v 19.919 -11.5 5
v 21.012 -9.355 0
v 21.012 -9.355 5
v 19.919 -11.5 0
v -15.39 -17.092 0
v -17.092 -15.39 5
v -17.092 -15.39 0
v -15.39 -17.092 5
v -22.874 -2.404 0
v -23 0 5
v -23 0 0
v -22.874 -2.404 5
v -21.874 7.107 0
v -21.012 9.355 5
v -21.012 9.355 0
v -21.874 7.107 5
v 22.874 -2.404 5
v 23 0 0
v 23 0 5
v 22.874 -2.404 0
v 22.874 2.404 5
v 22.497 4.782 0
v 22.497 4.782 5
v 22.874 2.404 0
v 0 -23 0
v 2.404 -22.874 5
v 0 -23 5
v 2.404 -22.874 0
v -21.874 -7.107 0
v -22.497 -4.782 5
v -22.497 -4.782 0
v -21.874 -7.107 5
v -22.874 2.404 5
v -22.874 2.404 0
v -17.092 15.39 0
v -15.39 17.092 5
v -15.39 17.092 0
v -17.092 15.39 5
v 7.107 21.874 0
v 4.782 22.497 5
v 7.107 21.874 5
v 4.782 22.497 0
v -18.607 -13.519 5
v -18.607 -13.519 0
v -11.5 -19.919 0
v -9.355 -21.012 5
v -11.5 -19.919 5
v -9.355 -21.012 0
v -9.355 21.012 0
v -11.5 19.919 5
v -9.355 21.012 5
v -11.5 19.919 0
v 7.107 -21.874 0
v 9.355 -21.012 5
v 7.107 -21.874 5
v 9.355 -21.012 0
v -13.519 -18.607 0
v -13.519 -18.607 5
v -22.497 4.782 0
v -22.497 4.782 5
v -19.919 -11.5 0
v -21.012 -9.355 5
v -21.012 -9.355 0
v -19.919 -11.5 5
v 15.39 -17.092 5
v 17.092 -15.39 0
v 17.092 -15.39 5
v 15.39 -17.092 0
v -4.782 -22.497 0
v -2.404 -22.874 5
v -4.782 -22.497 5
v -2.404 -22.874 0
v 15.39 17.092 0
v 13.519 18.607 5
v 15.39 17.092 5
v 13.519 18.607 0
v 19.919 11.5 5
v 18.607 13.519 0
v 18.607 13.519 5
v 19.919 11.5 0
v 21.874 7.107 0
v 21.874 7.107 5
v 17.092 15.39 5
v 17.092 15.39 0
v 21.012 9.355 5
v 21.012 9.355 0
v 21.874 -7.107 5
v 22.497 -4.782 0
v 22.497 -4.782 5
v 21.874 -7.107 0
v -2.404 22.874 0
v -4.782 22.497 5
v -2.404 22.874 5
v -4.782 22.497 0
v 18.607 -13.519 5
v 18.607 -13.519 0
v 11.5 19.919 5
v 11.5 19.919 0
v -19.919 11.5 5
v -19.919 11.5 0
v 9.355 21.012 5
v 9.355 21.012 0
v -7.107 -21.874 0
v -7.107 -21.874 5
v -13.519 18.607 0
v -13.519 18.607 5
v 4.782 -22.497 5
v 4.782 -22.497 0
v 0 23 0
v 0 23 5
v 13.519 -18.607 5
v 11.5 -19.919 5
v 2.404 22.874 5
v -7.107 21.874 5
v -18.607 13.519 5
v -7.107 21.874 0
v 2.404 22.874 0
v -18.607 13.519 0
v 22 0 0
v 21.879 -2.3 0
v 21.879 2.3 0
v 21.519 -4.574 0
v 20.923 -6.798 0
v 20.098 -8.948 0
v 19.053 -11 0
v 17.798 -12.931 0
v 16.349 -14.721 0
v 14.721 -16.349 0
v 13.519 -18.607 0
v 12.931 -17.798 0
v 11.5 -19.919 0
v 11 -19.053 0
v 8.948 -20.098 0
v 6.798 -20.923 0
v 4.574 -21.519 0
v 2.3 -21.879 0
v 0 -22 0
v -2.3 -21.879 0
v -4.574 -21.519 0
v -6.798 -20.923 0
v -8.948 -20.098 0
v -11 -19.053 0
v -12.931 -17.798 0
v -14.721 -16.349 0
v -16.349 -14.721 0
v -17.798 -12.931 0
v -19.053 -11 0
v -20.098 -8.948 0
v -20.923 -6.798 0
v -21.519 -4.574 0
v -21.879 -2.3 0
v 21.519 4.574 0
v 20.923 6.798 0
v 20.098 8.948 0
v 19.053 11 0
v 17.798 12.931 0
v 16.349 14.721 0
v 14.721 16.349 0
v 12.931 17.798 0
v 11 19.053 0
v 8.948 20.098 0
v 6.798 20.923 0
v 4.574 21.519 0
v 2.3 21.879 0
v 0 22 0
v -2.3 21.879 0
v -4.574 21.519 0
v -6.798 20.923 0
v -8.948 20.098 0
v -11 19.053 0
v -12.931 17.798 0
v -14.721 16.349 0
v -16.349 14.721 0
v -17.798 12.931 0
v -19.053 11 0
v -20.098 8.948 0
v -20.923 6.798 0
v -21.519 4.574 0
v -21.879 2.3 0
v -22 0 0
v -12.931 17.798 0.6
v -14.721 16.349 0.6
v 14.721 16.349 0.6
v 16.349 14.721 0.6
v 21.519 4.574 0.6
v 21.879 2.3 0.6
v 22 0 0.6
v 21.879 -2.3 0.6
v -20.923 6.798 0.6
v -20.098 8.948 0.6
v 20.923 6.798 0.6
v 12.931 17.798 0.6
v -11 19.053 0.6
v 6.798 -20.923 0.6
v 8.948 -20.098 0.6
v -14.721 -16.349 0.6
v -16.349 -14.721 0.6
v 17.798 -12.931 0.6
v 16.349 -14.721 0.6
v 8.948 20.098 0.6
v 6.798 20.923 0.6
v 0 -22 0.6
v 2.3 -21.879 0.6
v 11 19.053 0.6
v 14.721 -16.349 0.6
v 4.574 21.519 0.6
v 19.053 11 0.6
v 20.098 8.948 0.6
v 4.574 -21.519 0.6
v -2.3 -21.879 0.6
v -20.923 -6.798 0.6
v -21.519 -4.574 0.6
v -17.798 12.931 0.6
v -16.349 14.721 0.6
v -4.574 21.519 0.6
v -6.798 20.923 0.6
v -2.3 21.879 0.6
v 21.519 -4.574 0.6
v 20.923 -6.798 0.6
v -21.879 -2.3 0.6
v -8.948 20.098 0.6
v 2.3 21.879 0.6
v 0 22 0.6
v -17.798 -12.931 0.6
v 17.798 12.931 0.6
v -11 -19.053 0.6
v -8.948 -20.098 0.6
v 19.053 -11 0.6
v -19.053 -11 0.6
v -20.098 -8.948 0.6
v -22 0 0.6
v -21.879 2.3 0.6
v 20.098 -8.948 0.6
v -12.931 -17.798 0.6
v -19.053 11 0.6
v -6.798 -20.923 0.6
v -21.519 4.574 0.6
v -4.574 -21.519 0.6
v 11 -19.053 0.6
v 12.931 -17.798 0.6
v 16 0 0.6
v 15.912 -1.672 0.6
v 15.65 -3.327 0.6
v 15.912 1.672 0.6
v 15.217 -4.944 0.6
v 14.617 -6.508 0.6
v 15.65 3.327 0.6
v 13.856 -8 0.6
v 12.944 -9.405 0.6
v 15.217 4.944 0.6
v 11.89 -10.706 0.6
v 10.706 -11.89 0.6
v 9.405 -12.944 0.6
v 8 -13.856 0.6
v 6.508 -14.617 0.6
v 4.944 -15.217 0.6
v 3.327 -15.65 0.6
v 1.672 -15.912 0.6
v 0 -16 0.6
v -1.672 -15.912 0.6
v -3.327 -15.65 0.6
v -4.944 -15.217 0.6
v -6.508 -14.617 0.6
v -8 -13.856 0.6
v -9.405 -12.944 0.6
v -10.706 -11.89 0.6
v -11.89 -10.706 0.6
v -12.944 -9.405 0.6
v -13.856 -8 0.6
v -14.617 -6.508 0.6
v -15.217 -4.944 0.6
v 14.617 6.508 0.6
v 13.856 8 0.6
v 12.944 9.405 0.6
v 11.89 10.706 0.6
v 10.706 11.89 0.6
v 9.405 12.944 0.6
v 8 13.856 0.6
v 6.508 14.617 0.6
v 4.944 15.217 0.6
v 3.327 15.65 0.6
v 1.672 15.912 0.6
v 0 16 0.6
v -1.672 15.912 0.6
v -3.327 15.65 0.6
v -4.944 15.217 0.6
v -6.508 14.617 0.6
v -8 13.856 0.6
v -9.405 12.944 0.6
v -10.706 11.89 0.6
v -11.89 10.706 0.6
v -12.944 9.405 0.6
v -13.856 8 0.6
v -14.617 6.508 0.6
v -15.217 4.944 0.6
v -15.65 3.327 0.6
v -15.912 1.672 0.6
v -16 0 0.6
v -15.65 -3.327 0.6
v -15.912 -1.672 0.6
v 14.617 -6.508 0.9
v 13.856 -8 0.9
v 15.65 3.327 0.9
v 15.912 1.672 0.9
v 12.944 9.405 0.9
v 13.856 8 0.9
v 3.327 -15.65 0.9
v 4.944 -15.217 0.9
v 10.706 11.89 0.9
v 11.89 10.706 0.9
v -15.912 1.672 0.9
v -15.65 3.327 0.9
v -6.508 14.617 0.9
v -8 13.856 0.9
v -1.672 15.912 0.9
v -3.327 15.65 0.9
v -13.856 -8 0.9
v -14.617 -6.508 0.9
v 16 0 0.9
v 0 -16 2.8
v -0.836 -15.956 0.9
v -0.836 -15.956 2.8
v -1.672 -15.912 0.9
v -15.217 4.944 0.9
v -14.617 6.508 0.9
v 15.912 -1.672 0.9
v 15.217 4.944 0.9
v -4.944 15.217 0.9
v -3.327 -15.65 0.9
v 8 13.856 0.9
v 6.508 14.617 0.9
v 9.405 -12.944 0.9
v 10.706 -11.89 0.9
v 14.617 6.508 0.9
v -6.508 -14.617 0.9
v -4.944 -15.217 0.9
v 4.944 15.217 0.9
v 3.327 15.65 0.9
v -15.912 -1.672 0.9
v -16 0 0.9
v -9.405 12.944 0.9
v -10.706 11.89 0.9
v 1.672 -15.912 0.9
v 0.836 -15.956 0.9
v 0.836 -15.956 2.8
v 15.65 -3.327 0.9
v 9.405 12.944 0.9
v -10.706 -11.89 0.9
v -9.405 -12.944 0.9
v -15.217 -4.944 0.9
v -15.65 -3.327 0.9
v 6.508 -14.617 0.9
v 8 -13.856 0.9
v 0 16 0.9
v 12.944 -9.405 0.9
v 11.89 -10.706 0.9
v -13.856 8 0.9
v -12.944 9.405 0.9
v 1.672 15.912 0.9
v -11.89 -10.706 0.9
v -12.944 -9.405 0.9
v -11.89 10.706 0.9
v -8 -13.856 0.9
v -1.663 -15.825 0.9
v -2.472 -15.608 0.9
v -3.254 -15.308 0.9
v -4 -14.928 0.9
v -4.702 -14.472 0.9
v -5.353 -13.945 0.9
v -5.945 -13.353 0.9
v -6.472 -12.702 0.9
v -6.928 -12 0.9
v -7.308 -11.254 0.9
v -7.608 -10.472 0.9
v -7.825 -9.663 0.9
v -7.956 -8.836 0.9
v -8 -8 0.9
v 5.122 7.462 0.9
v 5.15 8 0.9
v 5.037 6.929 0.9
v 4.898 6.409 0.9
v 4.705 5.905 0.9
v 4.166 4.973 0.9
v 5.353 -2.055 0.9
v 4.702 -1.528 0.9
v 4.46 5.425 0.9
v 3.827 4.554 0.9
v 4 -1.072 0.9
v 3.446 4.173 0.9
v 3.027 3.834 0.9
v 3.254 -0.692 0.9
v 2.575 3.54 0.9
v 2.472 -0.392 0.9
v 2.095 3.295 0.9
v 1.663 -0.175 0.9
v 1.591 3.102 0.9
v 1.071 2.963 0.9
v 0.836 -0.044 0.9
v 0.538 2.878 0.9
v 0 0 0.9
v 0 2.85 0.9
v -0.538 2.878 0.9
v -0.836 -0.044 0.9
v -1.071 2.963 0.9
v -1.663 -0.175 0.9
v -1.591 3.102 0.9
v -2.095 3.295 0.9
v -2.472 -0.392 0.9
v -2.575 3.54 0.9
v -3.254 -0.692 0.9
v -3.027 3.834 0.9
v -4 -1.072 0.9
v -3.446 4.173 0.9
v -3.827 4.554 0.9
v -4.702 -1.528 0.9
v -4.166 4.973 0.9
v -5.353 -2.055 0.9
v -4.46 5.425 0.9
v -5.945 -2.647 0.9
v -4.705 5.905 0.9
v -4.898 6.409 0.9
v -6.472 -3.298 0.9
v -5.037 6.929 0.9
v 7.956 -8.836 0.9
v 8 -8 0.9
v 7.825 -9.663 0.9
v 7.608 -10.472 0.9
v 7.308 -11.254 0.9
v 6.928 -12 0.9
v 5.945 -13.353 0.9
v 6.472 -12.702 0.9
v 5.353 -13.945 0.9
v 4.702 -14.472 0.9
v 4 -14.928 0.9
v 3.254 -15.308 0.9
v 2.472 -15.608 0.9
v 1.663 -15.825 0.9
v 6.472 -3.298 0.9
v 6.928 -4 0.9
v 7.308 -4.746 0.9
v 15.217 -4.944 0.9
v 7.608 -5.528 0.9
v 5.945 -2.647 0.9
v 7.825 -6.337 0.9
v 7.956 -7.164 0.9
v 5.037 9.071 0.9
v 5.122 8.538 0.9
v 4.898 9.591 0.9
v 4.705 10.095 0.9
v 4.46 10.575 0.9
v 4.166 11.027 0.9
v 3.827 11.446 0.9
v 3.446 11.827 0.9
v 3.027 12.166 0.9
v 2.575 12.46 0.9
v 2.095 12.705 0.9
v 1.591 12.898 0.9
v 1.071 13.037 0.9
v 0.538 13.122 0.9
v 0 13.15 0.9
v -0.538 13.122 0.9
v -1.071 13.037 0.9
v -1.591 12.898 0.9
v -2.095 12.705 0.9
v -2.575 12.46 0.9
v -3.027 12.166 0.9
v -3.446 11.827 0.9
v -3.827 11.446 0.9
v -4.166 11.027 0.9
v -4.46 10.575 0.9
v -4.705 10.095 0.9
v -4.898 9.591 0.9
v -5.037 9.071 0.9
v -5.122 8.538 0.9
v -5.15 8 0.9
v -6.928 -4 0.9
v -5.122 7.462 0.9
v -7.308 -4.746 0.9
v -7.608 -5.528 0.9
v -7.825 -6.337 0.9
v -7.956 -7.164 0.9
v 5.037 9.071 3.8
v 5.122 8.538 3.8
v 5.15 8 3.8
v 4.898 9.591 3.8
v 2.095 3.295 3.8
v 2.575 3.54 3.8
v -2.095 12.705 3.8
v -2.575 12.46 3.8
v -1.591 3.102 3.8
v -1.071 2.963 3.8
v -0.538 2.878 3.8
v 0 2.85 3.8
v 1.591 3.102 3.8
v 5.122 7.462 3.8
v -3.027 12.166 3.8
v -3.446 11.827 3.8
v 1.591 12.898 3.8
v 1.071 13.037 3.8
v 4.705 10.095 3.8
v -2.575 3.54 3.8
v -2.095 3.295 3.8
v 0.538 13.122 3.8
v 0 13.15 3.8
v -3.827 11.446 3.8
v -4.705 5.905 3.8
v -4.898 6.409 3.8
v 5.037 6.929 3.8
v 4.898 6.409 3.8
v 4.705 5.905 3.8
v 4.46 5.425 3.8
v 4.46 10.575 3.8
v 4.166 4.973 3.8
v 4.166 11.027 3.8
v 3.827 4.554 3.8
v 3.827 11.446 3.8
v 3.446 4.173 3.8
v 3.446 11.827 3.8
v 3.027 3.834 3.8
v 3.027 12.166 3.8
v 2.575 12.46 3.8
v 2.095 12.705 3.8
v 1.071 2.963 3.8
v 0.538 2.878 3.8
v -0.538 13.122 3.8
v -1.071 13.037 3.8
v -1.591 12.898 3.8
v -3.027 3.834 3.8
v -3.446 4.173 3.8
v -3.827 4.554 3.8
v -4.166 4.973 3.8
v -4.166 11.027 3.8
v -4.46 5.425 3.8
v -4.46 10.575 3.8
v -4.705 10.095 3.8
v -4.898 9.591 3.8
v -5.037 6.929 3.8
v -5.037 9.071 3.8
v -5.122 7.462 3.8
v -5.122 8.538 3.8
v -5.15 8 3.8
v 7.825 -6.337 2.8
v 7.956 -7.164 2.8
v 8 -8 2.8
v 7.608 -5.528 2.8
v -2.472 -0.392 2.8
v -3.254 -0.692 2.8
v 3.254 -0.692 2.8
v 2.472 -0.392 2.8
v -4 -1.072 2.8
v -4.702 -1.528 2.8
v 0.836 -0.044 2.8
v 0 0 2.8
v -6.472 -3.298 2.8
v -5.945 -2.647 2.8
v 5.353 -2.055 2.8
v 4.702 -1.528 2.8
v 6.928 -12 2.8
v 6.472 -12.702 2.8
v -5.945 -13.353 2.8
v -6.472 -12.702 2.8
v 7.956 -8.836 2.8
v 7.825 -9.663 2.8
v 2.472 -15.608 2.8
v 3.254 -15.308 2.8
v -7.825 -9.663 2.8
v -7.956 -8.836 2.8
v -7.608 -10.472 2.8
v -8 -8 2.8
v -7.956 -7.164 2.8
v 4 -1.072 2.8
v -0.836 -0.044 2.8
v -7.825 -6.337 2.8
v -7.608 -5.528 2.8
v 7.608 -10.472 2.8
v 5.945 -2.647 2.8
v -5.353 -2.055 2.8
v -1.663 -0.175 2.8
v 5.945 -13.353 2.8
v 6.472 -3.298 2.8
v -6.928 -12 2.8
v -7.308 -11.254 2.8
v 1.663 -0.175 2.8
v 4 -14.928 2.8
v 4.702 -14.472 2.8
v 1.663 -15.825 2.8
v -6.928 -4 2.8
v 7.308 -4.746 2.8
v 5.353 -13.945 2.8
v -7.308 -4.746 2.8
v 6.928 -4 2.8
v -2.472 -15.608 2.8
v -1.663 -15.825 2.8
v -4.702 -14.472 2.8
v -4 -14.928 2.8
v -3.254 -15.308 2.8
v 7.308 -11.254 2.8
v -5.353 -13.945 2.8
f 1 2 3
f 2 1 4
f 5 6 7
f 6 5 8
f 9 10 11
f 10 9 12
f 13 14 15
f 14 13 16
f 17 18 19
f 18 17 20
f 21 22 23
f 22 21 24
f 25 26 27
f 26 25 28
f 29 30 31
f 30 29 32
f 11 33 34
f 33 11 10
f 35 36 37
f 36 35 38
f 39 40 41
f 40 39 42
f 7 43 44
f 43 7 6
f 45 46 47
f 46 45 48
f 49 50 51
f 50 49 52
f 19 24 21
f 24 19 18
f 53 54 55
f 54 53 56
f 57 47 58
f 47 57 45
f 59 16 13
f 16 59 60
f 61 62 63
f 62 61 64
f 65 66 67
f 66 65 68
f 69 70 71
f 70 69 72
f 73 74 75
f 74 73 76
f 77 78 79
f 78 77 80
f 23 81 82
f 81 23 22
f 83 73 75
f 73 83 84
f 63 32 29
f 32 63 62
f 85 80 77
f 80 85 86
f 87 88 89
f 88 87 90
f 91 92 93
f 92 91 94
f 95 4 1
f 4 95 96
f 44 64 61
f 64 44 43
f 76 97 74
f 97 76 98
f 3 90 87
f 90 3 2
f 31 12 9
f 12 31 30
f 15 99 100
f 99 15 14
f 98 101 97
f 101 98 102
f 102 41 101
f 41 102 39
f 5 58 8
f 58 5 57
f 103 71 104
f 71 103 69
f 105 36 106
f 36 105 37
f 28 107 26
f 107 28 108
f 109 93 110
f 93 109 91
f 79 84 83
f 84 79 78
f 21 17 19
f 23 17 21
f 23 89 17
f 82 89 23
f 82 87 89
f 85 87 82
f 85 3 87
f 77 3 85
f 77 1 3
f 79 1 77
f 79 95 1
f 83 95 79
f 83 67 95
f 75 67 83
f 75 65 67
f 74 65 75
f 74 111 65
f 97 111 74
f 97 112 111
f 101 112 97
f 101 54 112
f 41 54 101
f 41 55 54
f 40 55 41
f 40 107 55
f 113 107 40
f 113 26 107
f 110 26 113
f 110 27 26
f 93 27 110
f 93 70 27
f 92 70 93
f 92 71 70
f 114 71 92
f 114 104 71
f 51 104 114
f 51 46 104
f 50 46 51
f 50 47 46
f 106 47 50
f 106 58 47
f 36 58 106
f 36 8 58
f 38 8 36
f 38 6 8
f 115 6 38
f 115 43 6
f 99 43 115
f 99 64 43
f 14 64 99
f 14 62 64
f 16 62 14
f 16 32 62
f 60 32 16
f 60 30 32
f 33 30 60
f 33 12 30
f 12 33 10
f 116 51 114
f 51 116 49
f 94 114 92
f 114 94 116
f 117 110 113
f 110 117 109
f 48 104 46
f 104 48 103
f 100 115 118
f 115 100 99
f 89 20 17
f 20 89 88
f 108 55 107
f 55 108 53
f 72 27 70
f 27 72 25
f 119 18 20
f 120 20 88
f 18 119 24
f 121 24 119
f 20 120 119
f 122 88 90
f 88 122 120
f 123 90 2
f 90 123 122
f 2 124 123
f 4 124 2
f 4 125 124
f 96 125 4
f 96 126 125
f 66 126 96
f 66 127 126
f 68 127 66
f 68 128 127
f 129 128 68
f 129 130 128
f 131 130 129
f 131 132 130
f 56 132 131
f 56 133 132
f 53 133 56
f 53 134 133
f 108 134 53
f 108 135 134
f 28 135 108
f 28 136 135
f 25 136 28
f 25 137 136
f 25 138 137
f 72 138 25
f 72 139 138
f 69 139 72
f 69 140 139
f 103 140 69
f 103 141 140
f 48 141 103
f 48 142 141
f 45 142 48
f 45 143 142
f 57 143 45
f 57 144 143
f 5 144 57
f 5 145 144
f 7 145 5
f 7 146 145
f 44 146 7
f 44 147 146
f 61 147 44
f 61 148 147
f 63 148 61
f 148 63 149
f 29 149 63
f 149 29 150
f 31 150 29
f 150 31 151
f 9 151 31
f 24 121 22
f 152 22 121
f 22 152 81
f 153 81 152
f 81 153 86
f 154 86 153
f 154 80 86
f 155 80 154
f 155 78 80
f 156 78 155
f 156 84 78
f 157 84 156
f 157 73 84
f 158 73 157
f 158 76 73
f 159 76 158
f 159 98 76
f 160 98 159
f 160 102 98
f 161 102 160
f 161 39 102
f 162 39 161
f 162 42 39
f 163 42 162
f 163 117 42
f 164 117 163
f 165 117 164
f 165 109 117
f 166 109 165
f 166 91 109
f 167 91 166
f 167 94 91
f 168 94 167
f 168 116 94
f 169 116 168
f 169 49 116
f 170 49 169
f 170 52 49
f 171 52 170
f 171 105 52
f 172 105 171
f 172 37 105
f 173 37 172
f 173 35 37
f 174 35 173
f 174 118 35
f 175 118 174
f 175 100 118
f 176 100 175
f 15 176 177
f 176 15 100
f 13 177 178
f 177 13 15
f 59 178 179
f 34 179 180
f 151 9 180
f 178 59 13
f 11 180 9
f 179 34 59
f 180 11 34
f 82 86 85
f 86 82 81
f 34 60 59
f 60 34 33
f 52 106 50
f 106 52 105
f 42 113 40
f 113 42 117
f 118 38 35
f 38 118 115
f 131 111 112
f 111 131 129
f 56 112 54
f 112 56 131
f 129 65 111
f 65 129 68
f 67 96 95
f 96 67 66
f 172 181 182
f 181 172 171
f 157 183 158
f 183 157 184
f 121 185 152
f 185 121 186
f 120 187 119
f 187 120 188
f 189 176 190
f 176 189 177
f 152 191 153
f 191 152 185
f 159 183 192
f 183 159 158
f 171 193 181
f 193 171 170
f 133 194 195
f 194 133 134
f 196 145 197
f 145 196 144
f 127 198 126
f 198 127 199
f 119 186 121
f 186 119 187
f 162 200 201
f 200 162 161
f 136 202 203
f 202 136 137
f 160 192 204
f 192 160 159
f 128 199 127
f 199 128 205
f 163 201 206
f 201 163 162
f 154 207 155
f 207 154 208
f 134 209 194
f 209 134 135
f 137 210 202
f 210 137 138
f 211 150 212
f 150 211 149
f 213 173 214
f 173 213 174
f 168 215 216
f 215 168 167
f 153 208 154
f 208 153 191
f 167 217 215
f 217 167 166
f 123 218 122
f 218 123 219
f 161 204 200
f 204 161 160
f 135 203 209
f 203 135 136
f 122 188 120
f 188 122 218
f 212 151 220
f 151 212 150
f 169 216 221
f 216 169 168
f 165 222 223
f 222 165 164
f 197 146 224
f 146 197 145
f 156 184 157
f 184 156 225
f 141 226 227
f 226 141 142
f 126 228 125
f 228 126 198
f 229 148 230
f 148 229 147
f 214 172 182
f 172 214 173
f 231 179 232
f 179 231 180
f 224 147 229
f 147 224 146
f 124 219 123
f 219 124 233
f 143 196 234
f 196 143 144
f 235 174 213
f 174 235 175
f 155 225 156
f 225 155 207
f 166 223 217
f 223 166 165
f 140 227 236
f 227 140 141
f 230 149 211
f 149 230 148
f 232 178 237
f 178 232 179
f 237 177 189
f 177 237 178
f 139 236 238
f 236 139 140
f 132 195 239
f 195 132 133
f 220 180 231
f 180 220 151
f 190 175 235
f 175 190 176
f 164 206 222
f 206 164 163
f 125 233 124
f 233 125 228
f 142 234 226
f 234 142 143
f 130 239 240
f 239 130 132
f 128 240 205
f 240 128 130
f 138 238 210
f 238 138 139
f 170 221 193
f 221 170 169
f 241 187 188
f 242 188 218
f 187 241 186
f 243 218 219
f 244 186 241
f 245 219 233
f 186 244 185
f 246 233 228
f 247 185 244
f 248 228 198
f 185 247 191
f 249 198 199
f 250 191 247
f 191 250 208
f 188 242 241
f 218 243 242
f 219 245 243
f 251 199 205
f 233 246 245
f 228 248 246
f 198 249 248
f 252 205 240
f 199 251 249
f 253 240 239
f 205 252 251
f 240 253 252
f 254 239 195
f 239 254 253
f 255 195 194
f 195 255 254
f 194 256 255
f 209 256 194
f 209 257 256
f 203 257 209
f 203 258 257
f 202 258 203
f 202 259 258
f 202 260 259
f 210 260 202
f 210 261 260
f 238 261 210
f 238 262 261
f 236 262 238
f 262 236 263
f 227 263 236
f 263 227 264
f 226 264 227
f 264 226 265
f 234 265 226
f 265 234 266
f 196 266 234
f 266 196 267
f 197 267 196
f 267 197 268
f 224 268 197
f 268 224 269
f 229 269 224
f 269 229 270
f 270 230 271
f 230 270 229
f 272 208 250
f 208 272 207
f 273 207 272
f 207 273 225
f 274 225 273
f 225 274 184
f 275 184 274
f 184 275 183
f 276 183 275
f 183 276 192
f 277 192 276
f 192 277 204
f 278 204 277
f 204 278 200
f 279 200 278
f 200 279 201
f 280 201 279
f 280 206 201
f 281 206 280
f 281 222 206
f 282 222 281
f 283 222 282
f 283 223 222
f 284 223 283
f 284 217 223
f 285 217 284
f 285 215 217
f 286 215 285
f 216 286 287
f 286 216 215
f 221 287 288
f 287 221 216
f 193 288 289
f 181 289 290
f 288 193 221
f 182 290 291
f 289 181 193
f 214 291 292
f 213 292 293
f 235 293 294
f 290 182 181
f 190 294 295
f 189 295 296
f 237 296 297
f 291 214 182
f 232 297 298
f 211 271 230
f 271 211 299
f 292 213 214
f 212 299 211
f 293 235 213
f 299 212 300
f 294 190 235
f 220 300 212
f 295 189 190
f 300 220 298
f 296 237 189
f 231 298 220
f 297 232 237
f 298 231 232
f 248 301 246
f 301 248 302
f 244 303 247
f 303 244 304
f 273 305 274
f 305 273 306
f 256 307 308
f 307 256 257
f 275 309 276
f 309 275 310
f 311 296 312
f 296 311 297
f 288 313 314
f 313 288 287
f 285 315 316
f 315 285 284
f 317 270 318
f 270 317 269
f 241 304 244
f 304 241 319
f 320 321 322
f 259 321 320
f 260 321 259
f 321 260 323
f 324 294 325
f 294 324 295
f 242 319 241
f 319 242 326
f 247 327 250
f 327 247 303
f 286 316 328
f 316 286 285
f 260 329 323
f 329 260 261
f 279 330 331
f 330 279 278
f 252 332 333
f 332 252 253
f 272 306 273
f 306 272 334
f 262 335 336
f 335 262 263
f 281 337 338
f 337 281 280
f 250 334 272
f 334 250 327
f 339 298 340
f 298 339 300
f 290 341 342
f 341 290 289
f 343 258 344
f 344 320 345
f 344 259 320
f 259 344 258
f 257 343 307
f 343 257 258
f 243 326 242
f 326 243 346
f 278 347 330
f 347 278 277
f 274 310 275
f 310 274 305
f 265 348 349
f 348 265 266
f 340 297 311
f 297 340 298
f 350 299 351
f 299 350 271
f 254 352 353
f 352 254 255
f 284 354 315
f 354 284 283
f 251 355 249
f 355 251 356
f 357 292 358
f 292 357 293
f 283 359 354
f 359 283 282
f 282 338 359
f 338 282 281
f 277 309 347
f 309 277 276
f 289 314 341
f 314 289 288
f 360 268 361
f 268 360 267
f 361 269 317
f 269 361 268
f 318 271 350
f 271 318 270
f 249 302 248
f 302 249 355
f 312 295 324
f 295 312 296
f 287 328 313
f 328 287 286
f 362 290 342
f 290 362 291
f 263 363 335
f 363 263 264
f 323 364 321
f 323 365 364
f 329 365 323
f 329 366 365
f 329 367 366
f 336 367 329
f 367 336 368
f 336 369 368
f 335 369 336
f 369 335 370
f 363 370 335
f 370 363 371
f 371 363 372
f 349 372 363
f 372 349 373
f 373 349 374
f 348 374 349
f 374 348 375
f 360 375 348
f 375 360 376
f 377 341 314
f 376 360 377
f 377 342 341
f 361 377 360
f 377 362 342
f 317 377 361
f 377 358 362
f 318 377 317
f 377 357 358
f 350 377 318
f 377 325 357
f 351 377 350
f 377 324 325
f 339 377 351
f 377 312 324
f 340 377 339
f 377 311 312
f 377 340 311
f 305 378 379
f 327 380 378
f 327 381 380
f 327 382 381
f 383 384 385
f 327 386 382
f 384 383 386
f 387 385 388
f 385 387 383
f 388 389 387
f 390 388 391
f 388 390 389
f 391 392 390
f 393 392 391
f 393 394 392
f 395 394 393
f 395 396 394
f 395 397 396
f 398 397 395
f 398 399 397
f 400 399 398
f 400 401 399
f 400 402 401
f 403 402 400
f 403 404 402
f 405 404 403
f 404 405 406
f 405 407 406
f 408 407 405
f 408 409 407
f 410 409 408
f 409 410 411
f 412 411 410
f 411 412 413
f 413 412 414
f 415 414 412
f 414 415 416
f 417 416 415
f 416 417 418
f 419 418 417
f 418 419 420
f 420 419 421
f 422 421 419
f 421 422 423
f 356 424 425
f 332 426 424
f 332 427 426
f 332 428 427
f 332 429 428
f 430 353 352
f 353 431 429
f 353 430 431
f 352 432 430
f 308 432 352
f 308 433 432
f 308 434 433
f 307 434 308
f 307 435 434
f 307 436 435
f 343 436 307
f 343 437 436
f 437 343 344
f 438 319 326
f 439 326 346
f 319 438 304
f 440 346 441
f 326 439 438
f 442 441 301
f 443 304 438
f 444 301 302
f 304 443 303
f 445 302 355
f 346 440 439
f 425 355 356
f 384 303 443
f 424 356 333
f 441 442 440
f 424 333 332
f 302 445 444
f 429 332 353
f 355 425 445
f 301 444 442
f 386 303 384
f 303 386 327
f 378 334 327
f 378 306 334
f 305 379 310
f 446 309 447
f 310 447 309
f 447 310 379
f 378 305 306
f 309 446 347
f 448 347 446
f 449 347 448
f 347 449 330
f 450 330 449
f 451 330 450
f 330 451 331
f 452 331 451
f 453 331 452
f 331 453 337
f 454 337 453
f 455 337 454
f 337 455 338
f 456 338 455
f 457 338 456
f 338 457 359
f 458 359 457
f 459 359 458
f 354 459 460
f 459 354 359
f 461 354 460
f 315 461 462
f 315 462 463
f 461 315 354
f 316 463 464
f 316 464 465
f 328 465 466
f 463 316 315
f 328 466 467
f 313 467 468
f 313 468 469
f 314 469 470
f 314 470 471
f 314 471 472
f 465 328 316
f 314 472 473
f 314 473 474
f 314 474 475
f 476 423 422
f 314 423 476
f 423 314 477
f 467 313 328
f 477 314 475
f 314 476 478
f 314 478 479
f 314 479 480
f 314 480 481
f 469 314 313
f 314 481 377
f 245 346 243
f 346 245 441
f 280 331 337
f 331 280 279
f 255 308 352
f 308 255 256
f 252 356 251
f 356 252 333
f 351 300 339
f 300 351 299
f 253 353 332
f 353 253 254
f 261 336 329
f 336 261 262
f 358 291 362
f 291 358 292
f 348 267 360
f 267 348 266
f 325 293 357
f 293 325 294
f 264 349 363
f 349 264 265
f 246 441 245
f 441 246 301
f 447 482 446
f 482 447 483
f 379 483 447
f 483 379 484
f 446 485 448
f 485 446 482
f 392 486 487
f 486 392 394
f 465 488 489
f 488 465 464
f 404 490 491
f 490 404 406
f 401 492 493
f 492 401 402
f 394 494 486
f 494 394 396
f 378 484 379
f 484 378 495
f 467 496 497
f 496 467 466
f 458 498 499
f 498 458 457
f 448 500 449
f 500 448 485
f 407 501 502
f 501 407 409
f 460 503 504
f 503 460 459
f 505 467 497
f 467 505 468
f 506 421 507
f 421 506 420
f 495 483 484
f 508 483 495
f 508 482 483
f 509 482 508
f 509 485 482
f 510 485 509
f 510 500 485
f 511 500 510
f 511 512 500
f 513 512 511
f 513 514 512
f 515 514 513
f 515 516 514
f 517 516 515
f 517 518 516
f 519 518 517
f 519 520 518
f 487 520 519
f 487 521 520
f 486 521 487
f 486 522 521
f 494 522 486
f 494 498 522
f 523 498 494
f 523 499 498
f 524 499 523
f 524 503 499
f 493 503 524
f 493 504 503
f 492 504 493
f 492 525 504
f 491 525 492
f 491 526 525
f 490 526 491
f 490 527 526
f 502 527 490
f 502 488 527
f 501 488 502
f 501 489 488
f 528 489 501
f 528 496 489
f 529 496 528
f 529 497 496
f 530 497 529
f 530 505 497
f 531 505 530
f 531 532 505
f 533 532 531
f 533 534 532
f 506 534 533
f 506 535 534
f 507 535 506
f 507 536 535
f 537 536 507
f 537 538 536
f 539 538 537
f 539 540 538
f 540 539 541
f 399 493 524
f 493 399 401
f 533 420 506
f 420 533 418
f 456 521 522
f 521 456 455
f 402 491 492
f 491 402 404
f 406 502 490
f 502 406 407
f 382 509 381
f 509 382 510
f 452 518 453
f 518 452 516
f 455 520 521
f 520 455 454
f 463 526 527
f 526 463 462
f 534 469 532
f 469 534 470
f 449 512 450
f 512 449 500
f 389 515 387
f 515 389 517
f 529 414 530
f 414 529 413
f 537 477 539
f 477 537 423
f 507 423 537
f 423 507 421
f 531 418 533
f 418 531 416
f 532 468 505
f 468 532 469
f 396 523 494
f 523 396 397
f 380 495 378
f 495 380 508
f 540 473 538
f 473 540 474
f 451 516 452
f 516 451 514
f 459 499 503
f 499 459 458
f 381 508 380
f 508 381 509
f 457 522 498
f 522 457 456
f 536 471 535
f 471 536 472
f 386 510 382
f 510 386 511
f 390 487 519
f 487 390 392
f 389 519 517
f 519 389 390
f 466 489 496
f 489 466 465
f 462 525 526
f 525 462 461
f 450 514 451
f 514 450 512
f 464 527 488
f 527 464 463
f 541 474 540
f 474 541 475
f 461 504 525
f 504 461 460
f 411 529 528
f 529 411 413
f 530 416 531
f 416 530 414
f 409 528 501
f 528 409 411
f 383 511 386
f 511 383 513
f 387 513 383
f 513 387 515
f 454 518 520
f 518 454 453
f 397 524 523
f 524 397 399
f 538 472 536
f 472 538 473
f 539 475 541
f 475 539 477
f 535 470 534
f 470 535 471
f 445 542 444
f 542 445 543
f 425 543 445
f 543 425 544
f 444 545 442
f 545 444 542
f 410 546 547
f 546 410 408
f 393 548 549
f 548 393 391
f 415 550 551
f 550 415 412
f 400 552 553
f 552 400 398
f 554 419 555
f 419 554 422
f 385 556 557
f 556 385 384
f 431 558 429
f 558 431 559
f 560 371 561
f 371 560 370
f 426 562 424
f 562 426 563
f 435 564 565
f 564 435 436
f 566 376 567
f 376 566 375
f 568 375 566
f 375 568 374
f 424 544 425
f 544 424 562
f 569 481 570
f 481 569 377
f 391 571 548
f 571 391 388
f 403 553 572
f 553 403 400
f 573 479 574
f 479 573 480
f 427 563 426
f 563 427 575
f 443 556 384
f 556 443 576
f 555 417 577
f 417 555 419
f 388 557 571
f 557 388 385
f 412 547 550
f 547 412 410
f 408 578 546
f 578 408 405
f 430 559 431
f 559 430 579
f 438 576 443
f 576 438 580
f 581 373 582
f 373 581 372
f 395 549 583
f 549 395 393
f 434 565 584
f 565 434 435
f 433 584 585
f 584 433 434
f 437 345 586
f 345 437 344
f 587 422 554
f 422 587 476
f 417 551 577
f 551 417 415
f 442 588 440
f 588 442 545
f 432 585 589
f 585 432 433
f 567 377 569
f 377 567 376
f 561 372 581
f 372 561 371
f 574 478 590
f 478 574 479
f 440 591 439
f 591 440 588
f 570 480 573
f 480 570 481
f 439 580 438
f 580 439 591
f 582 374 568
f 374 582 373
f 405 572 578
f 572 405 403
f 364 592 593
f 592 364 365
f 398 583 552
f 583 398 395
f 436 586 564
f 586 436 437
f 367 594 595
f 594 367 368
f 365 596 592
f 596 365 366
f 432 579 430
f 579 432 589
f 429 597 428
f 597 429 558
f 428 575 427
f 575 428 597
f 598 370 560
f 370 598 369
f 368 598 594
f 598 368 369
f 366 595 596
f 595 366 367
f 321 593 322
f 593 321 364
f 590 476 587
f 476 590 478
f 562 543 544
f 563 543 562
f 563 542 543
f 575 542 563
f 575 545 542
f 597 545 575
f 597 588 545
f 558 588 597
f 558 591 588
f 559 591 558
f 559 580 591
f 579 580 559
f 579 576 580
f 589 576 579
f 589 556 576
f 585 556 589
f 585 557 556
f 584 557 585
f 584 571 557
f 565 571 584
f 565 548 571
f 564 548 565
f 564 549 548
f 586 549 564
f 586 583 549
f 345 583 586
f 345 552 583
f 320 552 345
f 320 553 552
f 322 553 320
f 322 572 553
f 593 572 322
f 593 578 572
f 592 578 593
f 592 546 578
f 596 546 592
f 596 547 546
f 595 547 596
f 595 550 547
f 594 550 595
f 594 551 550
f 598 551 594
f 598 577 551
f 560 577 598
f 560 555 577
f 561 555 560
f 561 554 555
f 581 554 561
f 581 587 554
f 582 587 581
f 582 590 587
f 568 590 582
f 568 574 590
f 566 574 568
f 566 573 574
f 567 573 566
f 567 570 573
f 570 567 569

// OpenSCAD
// ============================================================
// Tiki Tales — Figurine Maker
// ============================================================
// Takes any cute animal STL → adds NFC base with:
//   - NFC sticker pocket (NTAG213, 25mm)
//   - Neodymium magnet hole (10x3mm)
//   - Weight pocket (M8 washer / coin)
//   - Felt pad recess
//   - Flat 40mm base for stability
//   - Safety: all sealed, no small parts
//
// USAGE:
//   1. Download figurine STL → put in raw/ folder
//   2. Set raw_file below (or pass via -D on command line)
//   3. Render → Export as STL to ready/ folder
//
// PRINT INSTRUCTIONS:
//   - PLA, 0.2mm layers, 80-100% infill
//   - Pause at z = 1.5mm
//   - Insert: NFC sticker (face down), magnet, washer
//   - Resume print — top layers seal everything
//   - Apply 38mm felt pad on bottom after print
// ============================================================

$fn = 60;

// ---- INPUT FILE ----
// Change this to your downloaded figurine STL path
raw_file = "raw/PUT_YOUR_FILE_HERE.stl";

// ---- FIGURINE PARAMETERS ----
target_height  = 70;    // desired total height (mm) including base
base_dia       = 46;    // base diameter (wider for ~30mm NFC keychain disc)
base_h         = 5;     // base thickness (mm)
body_min_thick = 10;    // minimum feature thickness for safety (mm)

// ---- NFC POCKET (bottom of base, for NFC keychain disc) ----
nfc_dia   = 32;    // pocket diameter (keychain disc ~30mm + clearance)
nfc_depth = 0.3;   // shallow centering recess (tag sits in cavity)

// ---- MAGNET HOLE (10x3mm neodymium disc) ----
mag_dia   = 10.3;  // hole diameter (press fit with 0.3mm clearance)
mag_depth = 3.2;   // hole depth (magnet is 3mm + 0.2mm clearance)
mag_offset_x = 0;  // centered
mag_offset_y = 8;  // offset from center (away from NFC)

// ---- WEIGHT POCKET (M8 washer, coin, or steel balls) ----
wt_dia    = 16;    // pocket diameter
wt_depth  = 2.2;   // pocket depth (M8 washer is ~1.6mm)
wt_offset_x = 0;
wt_offset_y = -8;  // opposite side from magnet

// ---- FELT PAD RECESS (covers bottom) ----
felt_dia   = 44;   // slightly smaller than base (base_dia - 2)
felt_depth = 0.6;  // recess depth

// ---- PAUSE HEIGHT (for print-pause-insert method) ----
pause_z = 1.5;     // pause print at this Z height to insert components
                    // Below this: felt recess + bottom skin
                    // Above this: cavities get sealed by continued printing

// ---- SAFETY ROUNDING ----
base_edge_r = 2;   // fillet radius on base edges (no sharp corners)

// ============================================================
// MODULES
// ============================================================

// The universal NFC base — attach to any figurine
module nfc_base() {
    difference() {
        // Solid base disc with rounded edges
        hull() {
            // Bottom edge (rounded)
            translate([0, 0, base_edge_r])
                cylinder(d=base_dia - base_edge_r*2, h=0.01);
            translate([0, 0, base_edge_r])
                rotate_extrude()
                    translate([base_dia/2 - base_edge_r, 0, 0])
                        circle(r=base_edge_r);
            // Top edge (flat — figurine body sits here)
            cylinder(d=base_dia, h=base_h);
        }

        // ---- Felt pad recess (very bottom) ----
        translate([0, 0, -0.01])
            cylinder(d=felt_dia, h=felt_depth + 0.01);

        // ---- NFC sticker pocket (centered, just above felt) ----
        translate([0, 0, felt_depth])
            cylinder(d=nfc_dia, h=nfc_depth);

        // ---- Magnet hole (offset, deeper) ----
        translate([mag_offset_x, mag_offset_y, felt_depth])
            cylinder(d=mag_dia, h=mag_depth);

        // ---- Weight pocket (opposite side from magnet) ----
        translate([wt_offset_x, wt_offset_y, felt_depth])
            cylinder(d=wt_dia, h=wt_depth);
    }
}

// Scale a figurine to target height, measure from bounding box
// Note: OpenSCAD import() doesn't expose bounding box,
// so you measure in your slicer and set scale_factor manually
module scaled_figurine(file, s=1.0) {
    scale([s, s, s])
        import(file, convexity=10);
}

// ============================================================
// PREVIEW: Base only (for checking cavities)
// ============================================================
module preview_base() {
    difference() {
        nfc_base();
        // Cut in half to see cavities
        translate([0, -50, -1])
            cube([50, 100, 50]);
    }
}

// ============================================================
// ASSEMBLY: Figurine + NFC Base
// ============================================================

// The figurine scale factor — measure your raw STL height in slicer,
// then set this so final height = target_height
// Example: if raw STL is 35mm tall, scale = 70/35 = 2.0
figurine_scale = 1.0;  // ← ADJUST THIS after measuring raw STL

// Z offset: how far up to shift the figurine so it sits on the base
// If the raw figurine has its own base at z=0, set this to base_h
// If it floats, you may need to adjust
figurine_z_offset = base_h;

// ---- RENDER MODE ----
mode = "base_only";  // "base_only", "base_cross_section", "full", "figurine_only"

if (mode == "base_only") {
    // Just the universal NFC base (for testing/verifying cavities)
    nfc_base();
}
else if (mode == "base_cross_section") {
    // Cross-section view to verify cavity depths
    preview_base();
}
else if (mode == "figurine_only") {
    // Just the imported figurine (for measuring)
    scaled_figurine(raw_file, figurine_scale);
}
else if (mode == "full") {
    // Complete figurine with NFC base
    union() {
        nfc_base();
        translate([0, 0, figurine_z_offset])
            scaled_figurine(raw_file, figurine_scale);
    }
}

// ============================================================
echo("=== Tiki Tales Figurine Maker ===");
echo(str("Base: ", base_dia, "mm dia x ", base_h, "mm tall"));
echo(str("NFC pocket: ", nfc_dia, "mm x ", nfc_depth, "mm deep"));
echo(str("Magnet hole: ", mag_dia, "mm x ", mag_depth, "mm deep"));
echo(str("Weight pocket: ", wt_dia, "mm x ", wt_depth, "mm deep"));
echo(str("Felt recess: ", felt_dia, "mm x ", felt_depth, "mm deep"));
echo(str("Pause print at z = ", pause_z, "mm to insert components"));
echo(str("Target total height: ", target_height, "mm"));
